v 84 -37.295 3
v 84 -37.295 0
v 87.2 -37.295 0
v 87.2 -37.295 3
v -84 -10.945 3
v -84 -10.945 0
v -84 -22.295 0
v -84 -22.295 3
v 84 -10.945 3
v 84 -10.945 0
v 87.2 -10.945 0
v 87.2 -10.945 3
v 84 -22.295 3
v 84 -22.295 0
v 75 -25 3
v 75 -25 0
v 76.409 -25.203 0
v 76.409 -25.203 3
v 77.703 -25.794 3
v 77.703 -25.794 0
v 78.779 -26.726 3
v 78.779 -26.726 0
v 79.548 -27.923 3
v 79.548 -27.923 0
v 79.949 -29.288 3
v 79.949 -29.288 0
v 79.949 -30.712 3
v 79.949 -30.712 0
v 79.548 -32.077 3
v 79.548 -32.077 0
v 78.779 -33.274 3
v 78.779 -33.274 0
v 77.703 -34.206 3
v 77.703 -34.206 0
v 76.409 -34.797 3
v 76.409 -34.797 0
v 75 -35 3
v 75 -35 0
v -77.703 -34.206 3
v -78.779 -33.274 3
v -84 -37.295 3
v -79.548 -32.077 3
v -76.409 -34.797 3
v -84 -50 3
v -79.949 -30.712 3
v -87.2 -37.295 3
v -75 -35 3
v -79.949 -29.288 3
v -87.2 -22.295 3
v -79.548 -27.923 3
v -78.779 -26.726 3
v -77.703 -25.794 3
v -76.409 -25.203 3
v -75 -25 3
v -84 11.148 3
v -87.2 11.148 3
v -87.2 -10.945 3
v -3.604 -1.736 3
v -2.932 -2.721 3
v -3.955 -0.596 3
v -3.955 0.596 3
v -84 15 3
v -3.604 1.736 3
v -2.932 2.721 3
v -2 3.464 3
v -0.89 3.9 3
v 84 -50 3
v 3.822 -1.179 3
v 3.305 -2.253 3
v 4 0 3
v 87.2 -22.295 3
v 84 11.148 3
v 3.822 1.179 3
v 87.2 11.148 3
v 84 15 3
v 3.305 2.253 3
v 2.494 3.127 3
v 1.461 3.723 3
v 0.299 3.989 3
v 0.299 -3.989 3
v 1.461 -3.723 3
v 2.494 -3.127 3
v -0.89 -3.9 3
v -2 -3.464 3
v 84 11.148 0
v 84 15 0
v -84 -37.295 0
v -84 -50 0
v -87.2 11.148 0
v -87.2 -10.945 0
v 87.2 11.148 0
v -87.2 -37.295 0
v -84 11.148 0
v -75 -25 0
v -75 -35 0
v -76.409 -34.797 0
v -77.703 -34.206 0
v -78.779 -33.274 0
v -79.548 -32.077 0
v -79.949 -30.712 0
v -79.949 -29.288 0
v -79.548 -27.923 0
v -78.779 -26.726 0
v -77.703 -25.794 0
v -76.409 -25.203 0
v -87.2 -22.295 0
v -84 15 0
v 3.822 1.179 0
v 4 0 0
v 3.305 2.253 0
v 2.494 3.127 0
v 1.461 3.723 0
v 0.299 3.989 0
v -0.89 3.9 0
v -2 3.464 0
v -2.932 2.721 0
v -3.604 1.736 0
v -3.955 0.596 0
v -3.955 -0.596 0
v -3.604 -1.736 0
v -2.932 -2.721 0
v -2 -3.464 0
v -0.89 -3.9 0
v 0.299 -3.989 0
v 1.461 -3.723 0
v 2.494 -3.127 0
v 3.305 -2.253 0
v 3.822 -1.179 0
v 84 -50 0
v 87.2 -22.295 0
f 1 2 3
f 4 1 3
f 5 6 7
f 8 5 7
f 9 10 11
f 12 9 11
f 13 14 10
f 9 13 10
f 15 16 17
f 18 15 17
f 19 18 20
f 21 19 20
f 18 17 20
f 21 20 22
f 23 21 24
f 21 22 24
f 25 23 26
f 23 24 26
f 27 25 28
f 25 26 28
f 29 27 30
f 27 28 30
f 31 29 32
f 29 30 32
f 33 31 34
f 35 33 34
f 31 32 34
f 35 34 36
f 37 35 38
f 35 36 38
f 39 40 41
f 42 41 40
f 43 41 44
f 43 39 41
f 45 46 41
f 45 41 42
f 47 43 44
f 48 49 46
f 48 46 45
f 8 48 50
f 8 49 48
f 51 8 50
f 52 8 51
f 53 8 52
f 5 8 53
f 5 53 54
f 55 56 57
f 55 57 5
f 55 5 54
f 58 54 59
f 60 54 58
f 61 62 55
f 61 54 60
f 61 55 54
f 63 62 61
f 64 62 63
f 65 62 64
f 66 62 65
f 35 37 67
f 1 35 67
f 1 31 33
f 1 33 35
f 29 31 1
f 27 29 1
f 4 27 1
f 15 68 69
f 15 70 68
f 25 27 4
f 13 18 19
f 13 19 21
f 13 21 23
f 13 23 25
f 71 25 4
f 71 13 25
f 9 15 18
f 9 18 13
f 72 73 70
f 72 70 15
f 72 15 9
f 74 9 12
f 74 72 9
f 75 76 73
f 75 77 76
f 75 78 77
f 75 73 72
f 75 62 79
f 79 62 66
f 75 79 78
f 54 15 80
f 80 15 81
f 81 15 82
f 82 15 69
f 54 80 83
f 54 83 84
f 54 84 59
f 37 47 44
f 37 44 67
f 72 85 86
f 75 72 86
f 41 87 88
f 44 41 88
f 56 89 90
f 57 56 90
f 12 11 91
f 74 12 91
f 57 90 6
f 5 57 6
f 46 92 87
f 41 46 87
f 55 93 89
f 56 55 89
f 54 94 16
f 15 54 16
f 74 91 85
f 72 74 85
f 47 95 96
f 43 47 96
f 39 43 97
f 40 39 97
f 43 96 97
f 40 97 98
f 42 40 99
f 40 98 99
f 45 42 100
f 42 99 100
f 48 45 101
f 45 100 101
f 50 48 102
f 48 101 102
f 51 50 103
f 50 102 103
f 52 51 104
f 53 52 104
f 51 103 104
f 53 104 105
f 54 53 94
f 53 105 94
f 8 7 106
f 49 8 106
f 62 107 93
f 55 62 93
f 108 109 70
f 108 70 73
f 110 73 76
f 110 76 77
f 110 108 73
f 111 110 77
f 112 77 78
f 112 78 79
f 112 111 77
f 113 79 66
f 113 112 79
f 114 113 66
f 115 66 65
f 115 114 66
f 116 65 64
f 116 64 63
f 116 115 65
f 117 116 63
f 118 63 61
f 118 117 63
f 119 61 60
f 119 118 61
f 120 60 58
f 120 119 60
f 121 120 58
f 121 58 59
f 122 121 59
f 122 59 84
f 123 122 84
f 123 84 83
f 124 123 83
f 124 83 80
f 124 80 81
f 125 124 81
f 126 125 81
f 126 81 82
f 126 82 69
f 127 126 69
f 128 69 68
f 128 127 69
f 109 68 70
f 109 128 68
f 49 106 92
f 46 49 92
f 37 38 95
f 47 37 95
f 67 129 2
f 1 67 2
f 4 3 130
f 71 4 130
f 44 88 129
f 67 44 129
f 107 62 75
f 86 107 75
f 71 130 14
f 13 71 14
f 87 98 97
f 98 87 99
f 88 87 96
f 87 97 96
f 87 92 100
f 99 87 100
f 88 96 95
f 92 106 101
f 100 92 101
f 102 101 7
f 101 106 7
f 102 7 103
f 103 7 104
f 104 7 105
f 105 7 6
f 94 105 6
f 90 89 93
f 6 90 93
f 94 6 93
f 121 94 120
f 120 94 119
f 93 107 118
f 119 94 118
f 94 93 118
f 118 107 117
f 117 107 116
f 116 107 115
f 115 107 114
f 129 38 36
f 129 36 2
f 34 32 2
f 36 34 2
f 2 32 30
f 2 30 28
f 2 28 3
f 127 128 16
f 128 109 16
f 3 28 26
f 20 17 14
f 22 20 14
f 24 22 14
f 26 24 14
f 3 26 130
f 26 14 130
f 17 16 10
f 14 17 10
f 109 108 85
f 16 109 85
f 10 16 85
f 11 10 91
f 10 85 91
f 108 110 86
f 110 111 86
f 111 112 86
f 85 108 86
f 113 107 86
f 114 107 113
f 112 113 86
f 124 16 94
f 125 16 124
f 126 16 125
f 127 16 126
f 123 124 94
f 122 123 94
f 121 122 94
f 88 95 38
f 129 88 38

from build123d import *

# Parameters (mm, degrees)
CROQUIS1_R              = 4
SALIENTE_EXTRUIR1_DEPTH = 3
CROQUIS2_W              = 183.661988175
CROQUIS2_H              = 35
CORTAR_EXTRUIR1_DEPTH   = 4


with BuildPart() as part:
    # Croquis1 → Saliente-Extruir1 (new body)
    with BuildSketch(Plane.XY):
        Polygon((-84, 37.295390898), (-87.2, 37.295390898), (-87.2, 22.295390898), (-84, 22.295390898), (-84, 11.147890898), (-87.2, 11.147890898), (-87.2, -10.945390898), (-84, -10.945390898), (-84, -22.295390898), (-87.2, -22.295390898), (-87.2, -37.295390898), (-84, -37.295390898), (-84, -50), (84, -50), (84, -37.295390898), (87.2, -37.295390898), (87.2, -22.295390898), (84, -22.295390898), (84, -10.945390898), (87.2, -10.945390898), (87.2, 11.147890898), (84, 11.147890898), (84, 22.295390898), (87.2, 22.295390898), (87.2, 37.295390898), (84, 37.295390898), (84, 50), (-84, 50), align=None)
        Circle(CROQUIS1_R, mode=Mode.SUBTRACT)
        with BuildLine():
            Line((-75, -25), (75, -25))
            ThreePointArc((75, -25), (80, -30), (75, -35))
            Line((75, -35), (-75, -35))
            ThreePointArc((-75, -35), (-80, -30), (-75, -25))
        make_face(mode=Mode.SUBTRACT)
        with BuildLine():
            Line((-75, 25), (75, 25))
            ThreePointArc((75, 25), (80, 30), (75, 35))
            Line((75, 35), (-75, 35))
            ThreePointArc((-75, 35), (-80, 30), (-75, 25))
        make_face(mode=Mode.SUBTRACT)
    extrude(amount=SALIENTE_EXTRUIR1_DEPTH)

    # Croquis2 → Cortar-Extruir1 (cut, through all)
    with BuildSketch(Plane.XY.offset(3)):
        with Locations((-0.5645348, 32.5)):
            Rectangle(CROQUIS2_W, CROQUIS2_H)
    extrude(amount=-CORTAR_EXTRUIR1_DEPTH, mode=Mode.SUBTRACT)


solid = part.part
